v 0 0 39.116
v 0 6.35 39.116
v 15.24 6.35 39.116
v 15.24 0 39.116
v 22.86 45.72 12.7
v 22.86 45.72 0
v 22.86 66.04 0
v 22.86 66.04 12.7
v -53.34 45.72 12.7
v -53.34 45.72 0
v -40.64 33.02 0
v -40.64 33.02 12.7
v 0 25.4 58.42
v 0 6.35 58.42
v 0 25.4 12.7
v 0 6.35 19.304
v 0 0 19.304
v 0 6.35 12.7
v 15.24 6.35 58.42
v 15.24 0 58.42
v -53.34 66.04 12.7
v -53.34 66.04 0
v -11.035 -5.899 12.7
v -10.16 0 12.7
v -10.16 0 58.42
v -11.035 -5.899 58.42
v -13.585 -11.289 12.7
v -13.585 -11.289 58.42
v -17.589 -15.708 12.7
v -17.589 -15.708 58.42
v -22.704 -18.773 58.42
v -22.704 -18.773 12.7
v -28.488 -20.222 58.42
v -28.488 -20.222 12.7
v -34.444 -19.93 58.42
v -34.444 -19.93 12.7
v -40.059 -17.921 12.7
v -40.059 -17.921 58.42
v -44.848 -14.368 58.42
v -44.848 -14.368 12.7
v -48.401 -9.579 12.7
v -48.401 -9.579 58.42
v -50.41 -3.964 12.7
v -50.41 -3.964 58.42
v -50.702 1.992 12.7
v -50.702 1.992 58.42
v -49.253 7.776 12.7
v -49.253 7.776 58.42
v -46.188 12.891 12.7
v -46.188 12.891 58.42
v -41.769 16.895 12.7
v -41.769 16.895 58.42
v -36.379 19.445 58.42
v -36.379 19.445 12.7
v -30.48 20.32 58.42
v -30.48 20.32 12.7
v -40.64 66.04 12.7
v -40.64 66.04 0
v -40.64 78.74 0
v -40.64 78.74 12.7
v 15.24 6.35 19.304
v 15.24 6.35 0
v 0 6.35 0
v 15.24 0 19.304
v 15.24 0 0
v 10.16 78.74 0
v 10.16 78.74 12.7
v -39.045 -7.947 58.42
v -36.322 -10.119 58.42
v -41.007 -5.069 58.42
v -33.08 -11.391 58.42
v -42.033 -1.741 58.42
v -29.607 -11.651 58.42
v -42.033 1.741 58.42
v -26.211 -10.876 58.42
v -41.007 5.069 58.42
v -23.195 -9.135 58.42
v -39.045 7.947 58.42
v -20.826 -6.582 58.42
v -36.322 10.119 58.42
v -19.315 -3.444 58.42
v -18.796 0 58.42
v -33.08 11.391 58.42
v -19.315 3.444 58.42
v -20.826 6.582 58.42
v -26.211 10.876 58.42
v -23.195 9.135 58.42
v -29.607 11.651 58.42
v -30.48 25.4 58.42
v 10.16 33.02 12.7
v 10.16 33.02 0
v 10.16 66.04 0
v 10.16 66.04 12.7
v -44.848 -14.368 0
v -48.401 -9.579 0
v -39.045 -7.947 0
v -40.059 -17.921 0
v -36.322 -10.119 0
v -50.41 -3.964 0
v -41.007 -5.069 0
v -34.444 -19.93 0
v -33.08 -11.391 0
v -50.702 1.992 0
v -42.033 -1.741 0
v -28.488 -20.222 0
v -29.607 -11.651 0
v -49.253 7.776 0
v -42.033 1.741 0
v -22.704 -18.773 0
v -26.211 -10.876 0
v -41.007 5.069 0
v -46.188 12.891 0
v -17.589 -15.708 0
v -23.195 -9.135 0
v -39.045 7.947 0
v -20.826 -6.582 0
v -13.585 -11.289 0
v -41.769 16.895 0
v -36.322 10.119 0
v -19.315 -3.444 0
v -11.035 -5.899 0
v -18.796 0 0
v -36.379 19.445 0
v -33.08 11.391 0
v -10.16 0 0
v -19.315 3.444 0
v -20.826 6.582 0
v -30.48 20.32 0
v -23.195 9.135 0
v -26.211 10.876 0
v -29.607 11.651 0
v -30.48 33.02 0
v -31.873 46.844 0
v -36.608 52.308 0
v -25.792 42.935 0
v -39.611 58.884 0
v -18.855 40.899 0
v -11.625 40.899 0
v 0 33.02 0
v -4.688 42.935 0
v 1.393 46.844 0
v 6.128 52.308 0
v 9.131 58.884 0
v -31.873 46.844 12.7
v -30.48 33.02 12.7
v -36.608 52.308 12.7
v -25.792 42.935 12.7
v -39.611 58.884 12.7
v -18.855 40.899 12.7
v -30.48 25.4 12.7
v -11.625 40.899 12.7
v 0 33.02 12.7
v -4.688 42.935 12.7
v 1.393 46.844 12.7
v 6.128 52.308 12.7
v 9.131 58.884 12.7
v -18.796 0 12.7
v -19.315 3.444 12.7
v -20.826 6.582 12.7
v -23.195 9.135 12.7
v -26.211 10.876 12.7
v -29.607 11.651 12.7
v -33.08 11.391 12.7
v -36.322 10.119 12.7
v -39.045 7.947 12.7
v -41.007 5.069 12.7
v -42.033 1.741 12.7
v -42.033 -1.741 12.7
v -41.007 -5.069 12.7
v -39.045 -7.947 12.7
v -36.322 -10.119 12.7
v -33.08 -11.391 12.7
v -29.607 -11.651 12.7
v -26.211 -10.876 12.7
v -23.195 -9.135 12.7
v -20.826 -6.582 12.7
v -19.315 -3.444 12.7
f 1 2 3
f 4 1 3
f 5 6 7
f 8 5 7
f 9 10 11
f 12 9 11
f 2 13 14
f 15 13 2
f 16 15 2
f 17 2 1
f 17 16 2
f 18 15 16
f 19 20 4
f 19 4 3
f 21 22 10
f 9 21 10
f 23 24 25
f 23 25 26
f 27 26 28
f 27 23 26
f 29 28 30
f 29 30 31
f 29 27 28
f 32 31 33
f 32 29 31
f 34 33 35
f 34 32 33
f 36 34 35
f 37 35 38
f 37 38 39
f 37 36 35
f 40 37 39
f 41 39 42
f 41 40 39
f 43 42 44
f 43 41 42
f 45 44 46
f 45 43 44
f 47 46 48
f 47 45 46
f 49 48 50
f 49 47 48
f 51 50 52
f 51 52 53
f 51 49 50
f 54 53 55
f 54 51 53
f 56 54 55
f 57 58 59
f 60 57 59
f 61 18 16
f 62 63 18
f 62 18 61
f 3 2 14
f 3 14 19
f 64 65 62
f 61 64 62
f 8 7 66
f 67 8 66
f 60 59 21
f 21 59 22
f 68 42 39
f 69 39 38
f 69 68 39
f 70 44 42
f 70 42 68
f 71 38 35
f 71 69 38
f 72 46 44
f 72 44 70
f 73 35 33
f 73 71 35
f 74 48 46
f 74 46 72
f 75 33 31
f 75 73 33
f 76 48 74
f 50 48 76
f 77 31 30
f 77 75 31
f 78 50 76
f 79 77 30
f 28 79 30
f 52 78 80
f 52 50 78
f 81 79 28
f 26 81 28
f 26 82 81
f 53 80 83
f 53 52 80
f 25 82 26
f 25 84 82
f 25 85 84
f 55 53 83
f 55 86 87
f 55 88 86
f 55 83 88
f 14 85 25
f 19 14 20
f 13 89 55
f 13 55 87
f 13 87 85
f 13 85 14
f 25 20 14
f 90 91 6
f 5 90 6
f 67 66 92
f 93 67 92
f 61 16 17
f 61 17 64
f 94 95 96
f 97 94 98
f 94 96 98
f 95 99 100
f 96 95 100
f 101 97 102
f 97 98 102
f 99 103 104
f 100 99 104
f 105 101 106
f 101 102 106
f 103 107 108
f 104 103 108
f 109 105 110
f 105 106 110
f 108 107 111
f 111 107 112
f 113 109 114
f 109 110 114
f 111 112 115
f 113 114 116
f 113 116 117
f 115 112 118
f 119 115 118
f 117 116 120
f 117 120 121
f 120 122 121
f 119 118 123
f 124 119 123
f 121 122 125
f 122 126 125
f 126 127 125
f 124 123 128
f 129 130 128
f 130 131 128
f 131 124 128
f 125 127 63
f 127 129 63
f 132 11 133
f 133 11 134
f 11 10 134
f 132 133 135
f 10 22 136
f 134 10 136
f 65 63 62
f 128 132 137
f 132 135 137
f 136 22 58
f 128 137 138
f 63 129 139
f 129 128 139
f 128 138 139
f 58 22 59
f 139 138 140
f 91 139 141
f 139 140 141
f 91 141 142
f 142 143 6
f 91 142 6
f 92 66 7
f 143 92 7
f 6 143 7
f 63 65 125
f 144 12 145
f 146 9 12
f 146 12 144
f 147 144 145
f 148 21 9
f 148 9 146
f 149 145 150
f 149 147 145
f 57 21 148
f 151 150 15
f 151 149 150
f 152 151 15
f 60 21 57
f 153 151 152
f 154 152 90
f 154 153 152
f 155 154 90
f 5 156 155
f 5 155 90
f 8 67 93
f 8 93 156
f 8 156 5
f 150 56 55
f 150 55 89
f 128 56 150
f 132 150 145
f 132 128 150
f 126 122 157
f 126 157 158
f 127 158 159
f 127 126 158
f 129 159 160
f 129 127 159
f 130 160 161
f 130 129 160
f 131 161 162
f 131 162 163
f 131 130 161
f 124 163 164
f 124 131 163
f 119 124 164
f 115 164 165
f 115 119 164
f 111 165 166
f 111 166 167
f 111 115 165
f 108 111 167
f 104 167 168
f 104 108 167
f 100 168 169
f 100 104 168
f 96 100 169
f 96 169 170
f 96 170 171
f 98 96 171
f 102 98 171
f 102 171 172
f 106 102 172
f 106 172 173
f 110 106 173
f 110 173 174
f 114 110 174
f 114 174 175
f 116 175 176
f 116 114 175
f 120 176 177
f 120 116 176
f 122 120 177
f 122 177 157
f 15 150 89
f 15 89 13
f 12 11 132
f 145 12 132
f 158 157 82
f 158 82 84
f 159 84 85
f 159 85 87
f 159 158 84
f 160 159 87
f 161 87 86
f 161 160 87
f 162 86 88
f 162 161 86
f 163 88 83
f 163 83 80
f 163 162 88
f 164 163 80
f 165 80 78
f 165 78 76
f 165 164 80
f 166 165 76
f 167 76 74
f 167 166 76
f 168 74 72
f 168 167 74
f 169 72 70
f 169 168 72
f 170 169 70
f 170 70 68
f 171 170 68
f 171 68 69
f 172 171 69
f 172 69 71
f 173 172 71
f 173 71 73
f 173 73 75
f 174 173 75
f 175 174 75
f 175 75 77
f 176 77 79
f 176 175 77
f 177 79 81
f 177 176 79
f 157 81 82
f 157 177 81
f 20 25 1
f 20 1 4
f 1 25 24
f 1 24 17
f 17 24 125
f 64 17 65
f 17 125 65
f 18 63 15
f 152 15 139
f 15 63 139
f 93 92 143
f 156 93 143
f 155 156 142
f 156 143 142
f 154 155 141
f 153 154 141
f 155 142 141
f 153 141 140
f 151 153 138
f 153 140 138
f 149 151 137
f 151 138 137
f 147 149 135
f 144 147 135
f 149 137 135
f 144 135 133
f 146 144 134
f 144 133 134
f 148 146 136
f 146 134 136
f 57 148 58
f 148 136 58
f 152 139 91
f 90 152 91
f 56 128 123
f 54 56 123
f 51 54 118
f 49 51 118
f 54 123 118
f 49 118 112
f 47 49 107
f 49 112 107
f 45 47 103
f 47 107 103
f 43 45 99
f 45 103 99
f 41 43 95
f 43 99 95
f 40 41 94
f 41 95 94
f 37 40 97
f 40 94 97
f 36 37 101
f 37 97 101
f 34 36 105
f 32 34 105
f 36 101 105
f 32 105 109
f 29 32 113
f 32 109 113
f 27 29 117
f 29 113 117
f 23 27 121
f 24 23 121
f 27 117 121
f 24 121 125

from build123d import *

# Parameters (mm, degrees)
SKETCH1_R           = 11.684
BOSS_EXTRUDE1_DEPTH = 12.7
BOSS_EXTRUDE2_START = 12.7
SKETCH1_3_R         = 11.684
BOSS_EXTRUDE2_DEPTH = 45.72
SKETCH1_4_W         = 15.24
SKETCH1_4_H         = 6.35
BOSS_EXTRUDE3_DEPTH = 19.304
BOSS_EXTRUDE5_START = 39.116
SKETCH1_5_W         = 15.24
SKETCH1_5_H         = 6.35
BOSS_EXTRUDE5_DEPTH = 19.304


with BuildPart() as part:
    # Sketch1 → Boss-Extrude1 (new body)
    with BuildSketch(Plane.XY):
        with BuildLine():
            Line((-10.16, 0), (0, 0))
            Line((0, 0), (0, 6.35))
            Line((0, 6.35), (0, 25.4))
            Line((0, 25.4), (-30.48, 25.4))
            Line((-30.48, 25.4), (-30.48, 20.32))
            ThreePointArc((-30.48, 20.32), (-44.848409794, -14.368409794), (-10.16, 0))
        make_face()
        with Locations((-30.48, 0)):
            Circle(SKETCH1_R, mode=Mode.SUBTRACT)
        with BuildLine():
            Line((-30.48, 25.4), (0, 25.4))
            Line((0, 25.4), (0, 33.02))
            Line((0, 33.02), (10.16, 33.02))
            Line((10.16, 33.02), (22.86, 45.72))
            Line((22.86, 45.72), (22.86, 66.04))
            Line((22.86, 66.04), (10.16, 78.74))
            Line((10.16, 78.74), (10.16, 66.04))
            ThreePointArc((10.16, 66.04), (-15.24, 40.64), (-40.64, 66.04))
            Line((-40.64, 66.04), (-40.64, 78.74))
            Line((-40.64, 78.74), (-53.34, 66.04))
            Line((-53.34, 66.04), (-53.34, 45.72))
            Line((-53.34, 45.72), (-40.64, 33.02))
            Line((-40.64, 33.02), (-30.48, 33.02))
            Line((-30.48, 33.02), (-30.48, 25.4))
        make_face()
    extrude(amount=BOSS_EXTRUDE1_DEPTH)

    # Sketch1<3> → Boss-Extrude2 (add)
    with BuildSketch(Plane.XY.offset(BOSS_EXTRUDE2_START)):
        with BuildLine():
            Line((-30.48, 20.32), (-30.48, 25.4))
            Line((-30.48, 25.4), (0, 25.4))
            Line((0, 25.4), (0, 0))
            Line((0, 0), (-10.16, 0))
            ThreePointArc((-10.16, 0), (-44.848409794, -14.368409794), (-30.48, 20.32))
        make_face()
        with Locations((-30.48, 0)):
            Circle(SKETCH1_3_R, mode=Mode.SUBTRACT)
    extrude(amount=BOSS_EXTRUDE2_DEPTH)

    # Sketch1<4> → Boss-Extrude3 (add)
    with BuildSketch(Plane.XY):
        with Locations((7.62, 3.175)):
            Rectangle(SKETCH1_4_W, SKETCH1_4_H)
    extrude(amount=BOSS_EXTRUDE3_DEPTH)

    # Sketch1<5> → Boss-Extrude5 (add)
    with BuildSketch(Plane.XY.offset(BOSS_EXTRUDE5_START)):
        with Locations((7.62, 3.175)):
            Rectangle(SKETCH1_5_W, SKETCH1_5_H)
    extrude(amount=BOSS_EXTRUDE5_DEPTH)


solid = part.part
